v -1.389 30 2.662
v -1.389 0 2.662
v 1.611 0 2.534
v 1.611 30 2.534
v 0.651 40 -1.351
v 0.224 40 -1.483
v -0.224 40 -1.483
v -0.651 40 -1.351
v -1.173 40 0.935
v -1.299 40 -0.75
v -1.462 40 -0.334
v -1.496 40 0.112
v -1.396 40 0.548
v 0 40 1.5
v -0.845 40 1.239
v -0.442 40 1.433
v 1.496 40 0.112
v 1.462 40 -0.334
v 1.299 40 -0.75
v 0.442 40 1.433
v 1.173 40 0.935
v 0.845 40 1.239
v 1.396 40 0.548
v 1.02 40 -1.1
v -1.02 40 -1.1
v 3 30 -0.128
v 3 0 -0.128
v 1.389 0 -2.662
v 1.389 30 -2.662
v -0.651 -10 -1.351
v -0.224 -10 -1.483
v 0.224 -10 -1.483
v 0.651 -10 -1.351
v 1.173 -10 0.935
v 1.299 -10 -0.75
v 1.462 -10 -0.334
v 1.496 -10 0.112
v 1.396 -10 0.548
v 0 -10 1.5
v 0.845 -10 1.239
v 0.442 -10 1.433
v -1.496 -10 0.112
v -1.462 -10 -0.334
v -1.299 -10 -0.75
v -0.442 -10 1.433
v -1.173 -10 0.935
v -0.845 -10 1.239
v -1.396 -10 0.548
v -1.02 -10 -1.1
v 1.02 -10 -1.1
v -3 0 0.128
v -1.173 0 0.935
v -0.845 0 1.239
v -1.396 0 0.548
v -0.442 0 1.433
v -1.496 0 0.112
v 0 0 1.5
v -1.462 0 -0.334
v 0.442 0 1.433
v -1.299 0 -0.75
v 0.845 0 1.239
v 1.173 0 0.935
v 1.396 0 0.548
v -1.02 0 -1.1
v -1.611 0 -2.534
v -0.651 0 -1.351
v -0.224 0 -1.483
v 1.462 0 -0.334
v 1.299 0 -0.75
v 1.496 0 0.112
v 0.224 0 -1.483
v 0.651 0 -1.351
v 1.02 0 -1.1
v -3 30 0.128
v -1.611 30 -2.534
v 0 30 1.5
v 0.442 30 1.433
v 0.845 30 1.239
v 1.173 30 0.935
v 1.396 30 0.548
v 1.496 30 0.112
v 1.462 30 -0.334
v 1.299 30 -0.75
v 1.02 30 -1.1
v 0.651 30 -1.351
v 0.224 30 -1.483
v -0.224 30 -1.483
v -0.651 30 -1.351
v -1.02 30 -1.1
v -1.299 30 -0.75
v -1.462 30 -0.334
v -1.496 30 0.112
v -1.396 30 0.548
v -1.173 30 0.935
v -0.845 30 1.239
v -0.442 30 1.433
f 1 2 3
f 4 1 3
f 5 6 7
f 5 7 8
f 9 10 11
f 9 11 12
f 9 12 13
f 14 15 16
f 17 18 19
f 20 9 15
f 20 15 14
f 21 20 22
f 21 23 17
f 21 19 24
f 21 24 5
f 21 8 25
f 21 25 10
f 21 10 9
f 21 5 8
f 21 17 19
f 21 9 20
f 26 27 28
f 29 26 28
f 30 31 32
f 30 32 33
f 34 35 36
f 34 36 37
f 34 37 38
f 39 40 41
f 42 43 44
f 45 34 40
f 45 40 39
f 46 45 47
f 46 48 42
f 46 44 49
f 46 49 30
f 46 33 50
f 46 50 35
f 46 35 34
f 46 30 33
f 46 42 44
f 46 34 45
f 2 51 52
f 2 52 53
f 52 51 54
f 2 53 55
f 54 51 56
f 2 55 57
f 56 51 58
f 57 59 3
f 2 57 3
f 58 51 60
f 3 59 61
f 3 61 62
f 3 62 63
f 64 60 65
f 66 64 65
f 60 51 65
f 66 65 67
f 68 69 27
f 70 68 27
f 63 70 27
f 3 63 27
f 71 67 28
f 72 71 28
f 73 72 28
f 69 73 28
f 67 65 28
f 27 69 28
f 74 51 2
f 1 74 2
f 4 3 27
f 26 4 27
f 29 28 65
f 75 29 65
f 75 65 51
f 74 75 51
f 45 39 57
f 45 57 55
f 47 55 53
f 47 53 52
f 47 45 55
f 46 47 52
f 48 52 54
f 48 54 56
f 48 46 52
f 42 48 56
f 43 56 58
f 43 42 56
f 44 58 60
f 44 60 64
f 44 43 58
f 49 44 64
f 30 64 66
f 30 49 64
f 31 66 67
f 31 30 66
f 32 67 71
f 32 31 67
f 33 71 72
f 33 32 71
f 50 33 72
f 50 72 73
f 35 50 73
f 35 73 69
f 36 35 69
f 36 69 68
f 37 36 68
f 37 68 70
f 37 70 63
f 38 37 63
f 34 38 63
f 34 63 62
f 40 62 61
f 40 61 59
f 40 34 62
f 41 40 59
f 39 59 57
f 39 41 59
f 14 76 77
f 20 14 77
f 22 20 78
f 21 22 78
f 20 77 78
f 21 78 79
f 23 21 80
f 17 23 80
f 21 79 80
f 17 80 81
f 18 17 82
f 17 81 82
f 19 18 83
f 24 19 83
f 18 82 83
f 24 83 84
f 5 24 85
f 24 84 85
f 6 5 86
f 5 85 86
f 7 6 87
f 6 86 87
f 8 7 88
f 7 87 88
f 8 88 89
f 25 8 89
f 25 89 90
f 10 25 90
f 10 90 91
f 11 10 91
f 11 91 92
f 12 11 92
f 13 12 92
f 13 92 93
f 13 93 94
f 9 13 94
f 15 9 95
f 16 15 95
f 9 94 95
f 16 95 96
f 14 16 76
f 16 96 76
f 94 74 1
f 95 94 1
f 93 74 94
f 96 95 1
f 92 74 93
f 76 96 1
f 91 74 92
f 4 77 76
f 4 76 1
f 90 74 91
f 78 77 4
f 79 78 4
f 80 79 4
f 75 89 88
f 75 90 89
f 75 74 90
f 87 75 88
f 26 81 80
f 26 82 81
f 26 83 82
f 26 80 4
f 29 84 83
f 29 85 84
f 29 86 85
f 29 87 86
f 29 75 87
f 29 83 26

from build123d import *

# Parameters (mm, degrees)
BOSS_EXTRUDE1_DEPTH = 30
SKETCH4_R           = 1.5
BOSS_EXTRUDE2_DEPTH = 10
BOSS_EXTRUDE3_START = 10
SKETCH5_R           = 1.5
BOSS_EXTRUDE3_DEPTH = 10


with BuildPart() as part:
    # Sketch3 → Boss-Extrude1 (new body)
    with BuildSketch(Plane(origin=(0, 0, 0), x_dir=(1, 0, 0), z_dir=(0, 1, 0))):
        Polygon((1.388964752, 2.662182442), (-1.611035248, 2.533969981), (-3, -0.12821246), (-1.388964752, -2.662182442), (1.611035248, -2.533969981), (3, 0.12821246), align=None)
    extrude(amount=BOSS_EXTRUDE1_DEPTH)

    # Sketch4 → Boss-Extrude2 (add)
    with BuildSketch(Plane(origin=(0, 30, 0), x_dir=(1, 0, 0), z_dir=(0, 1, 0))):
        with Locations(Location((0, 0, 0), (0, 0, 270))):
            Circle(SKETCH4_R)
    extrude(amount=BOSS_EXTRUDE2_DEPTH)

    # Sketch5 → Boss-Extrude3 (add)
    with BuildSketch(Plane.XZ.offset(BOSS_EXTRUDE3_START)):
        with Locations(Location((0, 0, 0), (0, 0, 90))):
            Circle(SKETCH5_R)
    extrude(amount=-BOSS_EXTRUDE3_DEPTH)


solid = part.part
